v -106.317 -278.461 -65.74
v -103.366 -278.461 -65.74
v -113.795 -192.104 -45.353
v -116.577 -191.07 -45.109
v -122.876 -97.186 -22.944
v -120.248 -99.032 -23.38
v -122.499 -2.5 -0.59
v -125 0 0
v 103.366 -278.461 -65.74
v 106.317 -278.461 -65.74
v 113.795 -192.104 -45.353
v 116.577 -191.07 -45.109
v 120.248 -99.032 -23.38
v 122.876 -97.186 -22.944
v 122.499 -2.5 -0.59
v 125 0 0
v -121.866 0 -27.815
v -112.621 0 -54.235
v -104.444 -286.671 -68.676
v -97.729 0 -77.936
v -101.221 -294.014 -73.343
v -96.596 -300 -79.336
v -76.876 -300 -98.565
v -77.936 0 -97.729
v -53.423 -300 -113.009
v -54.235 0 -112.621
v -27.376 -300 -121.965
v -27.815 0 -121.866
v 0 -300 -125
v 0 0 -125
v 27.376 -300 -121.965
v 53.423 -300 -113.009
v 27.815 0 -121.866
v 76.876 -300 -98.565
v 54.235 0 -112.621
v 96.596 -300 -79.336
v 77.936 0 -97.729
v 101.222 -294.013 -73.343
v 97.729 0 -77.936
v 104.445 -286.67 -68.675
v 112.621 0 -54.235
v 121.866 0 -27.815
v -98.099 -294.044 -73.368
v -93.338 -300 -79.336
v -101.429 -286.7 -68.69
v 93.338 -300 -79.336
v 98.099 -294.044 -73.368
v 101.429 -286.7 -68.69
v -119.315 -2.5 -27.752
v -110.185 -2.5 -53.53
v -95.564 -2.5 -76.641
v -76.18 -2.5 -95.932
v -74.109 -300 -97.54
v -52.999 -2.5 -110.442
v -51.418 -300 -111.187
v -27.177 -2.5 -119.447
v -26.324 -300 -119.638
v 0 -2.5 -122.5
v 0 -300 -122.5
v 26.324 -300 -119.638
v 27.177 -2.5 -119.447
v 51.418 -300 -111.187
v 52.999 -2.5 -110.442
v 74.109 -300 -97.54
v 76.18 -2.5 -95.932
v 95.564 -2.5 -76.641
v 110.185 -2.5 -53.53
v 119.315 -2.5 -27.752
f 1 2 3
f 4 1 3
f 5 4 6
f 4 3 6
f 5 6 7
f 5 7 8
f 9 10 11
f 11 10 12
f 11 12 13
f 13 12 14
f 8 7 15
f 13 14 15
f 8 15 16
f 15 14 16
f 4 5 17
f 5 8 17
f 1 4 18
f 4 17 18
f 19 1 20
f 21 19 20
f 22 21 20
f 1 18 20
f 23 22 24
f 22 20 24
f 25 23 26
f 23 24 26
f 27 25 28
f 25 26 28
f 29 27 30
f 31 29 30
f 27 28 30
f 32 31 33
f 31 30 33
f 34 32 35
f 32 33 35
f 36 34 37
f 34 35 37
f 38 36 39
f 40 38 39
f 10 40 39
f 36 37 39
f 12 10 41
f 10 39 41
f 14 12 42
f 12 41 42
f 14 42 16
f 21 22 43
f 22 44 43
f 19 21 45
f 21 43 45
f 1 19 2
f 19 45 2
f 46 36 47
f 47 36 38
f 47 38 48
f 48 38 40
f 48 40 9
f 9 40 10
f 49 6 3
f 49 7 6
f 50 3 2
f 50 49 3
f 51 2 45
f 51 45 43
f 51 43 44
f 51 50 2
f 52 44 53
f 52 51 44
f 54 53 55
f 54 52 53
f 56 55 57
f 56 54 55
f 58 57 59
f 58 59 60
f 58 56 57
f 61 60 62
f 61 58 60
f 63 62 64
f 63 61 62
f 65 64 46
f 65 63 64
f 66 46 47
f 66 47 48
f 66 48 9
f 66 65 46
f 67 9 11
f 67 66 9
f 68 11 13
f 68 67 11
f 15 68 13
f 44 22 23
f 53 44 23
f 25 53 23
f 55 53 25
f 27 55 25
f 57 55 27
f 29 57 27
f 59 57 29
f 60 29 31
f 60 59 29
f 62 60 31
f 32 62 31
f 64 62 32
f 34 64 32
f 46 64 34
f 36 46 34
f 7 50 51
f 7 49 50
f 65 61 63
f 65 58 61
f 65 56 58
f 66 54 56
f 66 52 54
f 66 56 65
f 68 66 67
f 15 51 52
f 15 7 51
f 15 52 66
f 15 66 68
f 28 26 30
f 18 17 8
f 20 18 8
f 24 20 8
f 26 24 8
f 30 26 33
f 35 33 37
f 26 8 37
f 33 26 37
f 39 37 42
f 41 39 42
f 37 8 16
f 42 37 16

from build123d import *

# Parameters (mm, degrees)
F0_R     = 125
F1_DEPTH = 300
F3_T     = -2.5
F5_DEPTH = 331


with BuildPart() as f1:
    # F0 (on Front) → F1 (new body)
    with BuildSketch(Plane.XZ):
        Circle(F0_R)
    extrude(amount=F1_DEPTH)

    # F3
    f3_openings = [f1.faces().sort_by_distance(p)[0] for p in [
        (0, -300, 0),
    ]]
    offset(amount=F3_T, openings=f3_openings)

    # F4 (on offset) → F5 (cut)
    with BuildSketch(Plane.YZ.offset(125)):
        with BuildLine():
            Line((-278.461281, -65.740379), (0, 0))
            Line((0, 0), (37.560482, 139.173388))
            Line((37.560482, 139.173388), (-357.278258, 144.254044))
            Line((-357.278258, 144.254044), (-367.802441, -101.419425))
            Line((-367.802441, -101.419425), (-308.549038, -101.419425))
            ThreePointArc((-308.549038, -101.419425), (-299.400873, -78.60811), (-278.461281, -65.740379))
        make_face()
    extrude(amount=-F5_DEPTH, mode=Mode.SUBTRACT)


solid = f1.part
